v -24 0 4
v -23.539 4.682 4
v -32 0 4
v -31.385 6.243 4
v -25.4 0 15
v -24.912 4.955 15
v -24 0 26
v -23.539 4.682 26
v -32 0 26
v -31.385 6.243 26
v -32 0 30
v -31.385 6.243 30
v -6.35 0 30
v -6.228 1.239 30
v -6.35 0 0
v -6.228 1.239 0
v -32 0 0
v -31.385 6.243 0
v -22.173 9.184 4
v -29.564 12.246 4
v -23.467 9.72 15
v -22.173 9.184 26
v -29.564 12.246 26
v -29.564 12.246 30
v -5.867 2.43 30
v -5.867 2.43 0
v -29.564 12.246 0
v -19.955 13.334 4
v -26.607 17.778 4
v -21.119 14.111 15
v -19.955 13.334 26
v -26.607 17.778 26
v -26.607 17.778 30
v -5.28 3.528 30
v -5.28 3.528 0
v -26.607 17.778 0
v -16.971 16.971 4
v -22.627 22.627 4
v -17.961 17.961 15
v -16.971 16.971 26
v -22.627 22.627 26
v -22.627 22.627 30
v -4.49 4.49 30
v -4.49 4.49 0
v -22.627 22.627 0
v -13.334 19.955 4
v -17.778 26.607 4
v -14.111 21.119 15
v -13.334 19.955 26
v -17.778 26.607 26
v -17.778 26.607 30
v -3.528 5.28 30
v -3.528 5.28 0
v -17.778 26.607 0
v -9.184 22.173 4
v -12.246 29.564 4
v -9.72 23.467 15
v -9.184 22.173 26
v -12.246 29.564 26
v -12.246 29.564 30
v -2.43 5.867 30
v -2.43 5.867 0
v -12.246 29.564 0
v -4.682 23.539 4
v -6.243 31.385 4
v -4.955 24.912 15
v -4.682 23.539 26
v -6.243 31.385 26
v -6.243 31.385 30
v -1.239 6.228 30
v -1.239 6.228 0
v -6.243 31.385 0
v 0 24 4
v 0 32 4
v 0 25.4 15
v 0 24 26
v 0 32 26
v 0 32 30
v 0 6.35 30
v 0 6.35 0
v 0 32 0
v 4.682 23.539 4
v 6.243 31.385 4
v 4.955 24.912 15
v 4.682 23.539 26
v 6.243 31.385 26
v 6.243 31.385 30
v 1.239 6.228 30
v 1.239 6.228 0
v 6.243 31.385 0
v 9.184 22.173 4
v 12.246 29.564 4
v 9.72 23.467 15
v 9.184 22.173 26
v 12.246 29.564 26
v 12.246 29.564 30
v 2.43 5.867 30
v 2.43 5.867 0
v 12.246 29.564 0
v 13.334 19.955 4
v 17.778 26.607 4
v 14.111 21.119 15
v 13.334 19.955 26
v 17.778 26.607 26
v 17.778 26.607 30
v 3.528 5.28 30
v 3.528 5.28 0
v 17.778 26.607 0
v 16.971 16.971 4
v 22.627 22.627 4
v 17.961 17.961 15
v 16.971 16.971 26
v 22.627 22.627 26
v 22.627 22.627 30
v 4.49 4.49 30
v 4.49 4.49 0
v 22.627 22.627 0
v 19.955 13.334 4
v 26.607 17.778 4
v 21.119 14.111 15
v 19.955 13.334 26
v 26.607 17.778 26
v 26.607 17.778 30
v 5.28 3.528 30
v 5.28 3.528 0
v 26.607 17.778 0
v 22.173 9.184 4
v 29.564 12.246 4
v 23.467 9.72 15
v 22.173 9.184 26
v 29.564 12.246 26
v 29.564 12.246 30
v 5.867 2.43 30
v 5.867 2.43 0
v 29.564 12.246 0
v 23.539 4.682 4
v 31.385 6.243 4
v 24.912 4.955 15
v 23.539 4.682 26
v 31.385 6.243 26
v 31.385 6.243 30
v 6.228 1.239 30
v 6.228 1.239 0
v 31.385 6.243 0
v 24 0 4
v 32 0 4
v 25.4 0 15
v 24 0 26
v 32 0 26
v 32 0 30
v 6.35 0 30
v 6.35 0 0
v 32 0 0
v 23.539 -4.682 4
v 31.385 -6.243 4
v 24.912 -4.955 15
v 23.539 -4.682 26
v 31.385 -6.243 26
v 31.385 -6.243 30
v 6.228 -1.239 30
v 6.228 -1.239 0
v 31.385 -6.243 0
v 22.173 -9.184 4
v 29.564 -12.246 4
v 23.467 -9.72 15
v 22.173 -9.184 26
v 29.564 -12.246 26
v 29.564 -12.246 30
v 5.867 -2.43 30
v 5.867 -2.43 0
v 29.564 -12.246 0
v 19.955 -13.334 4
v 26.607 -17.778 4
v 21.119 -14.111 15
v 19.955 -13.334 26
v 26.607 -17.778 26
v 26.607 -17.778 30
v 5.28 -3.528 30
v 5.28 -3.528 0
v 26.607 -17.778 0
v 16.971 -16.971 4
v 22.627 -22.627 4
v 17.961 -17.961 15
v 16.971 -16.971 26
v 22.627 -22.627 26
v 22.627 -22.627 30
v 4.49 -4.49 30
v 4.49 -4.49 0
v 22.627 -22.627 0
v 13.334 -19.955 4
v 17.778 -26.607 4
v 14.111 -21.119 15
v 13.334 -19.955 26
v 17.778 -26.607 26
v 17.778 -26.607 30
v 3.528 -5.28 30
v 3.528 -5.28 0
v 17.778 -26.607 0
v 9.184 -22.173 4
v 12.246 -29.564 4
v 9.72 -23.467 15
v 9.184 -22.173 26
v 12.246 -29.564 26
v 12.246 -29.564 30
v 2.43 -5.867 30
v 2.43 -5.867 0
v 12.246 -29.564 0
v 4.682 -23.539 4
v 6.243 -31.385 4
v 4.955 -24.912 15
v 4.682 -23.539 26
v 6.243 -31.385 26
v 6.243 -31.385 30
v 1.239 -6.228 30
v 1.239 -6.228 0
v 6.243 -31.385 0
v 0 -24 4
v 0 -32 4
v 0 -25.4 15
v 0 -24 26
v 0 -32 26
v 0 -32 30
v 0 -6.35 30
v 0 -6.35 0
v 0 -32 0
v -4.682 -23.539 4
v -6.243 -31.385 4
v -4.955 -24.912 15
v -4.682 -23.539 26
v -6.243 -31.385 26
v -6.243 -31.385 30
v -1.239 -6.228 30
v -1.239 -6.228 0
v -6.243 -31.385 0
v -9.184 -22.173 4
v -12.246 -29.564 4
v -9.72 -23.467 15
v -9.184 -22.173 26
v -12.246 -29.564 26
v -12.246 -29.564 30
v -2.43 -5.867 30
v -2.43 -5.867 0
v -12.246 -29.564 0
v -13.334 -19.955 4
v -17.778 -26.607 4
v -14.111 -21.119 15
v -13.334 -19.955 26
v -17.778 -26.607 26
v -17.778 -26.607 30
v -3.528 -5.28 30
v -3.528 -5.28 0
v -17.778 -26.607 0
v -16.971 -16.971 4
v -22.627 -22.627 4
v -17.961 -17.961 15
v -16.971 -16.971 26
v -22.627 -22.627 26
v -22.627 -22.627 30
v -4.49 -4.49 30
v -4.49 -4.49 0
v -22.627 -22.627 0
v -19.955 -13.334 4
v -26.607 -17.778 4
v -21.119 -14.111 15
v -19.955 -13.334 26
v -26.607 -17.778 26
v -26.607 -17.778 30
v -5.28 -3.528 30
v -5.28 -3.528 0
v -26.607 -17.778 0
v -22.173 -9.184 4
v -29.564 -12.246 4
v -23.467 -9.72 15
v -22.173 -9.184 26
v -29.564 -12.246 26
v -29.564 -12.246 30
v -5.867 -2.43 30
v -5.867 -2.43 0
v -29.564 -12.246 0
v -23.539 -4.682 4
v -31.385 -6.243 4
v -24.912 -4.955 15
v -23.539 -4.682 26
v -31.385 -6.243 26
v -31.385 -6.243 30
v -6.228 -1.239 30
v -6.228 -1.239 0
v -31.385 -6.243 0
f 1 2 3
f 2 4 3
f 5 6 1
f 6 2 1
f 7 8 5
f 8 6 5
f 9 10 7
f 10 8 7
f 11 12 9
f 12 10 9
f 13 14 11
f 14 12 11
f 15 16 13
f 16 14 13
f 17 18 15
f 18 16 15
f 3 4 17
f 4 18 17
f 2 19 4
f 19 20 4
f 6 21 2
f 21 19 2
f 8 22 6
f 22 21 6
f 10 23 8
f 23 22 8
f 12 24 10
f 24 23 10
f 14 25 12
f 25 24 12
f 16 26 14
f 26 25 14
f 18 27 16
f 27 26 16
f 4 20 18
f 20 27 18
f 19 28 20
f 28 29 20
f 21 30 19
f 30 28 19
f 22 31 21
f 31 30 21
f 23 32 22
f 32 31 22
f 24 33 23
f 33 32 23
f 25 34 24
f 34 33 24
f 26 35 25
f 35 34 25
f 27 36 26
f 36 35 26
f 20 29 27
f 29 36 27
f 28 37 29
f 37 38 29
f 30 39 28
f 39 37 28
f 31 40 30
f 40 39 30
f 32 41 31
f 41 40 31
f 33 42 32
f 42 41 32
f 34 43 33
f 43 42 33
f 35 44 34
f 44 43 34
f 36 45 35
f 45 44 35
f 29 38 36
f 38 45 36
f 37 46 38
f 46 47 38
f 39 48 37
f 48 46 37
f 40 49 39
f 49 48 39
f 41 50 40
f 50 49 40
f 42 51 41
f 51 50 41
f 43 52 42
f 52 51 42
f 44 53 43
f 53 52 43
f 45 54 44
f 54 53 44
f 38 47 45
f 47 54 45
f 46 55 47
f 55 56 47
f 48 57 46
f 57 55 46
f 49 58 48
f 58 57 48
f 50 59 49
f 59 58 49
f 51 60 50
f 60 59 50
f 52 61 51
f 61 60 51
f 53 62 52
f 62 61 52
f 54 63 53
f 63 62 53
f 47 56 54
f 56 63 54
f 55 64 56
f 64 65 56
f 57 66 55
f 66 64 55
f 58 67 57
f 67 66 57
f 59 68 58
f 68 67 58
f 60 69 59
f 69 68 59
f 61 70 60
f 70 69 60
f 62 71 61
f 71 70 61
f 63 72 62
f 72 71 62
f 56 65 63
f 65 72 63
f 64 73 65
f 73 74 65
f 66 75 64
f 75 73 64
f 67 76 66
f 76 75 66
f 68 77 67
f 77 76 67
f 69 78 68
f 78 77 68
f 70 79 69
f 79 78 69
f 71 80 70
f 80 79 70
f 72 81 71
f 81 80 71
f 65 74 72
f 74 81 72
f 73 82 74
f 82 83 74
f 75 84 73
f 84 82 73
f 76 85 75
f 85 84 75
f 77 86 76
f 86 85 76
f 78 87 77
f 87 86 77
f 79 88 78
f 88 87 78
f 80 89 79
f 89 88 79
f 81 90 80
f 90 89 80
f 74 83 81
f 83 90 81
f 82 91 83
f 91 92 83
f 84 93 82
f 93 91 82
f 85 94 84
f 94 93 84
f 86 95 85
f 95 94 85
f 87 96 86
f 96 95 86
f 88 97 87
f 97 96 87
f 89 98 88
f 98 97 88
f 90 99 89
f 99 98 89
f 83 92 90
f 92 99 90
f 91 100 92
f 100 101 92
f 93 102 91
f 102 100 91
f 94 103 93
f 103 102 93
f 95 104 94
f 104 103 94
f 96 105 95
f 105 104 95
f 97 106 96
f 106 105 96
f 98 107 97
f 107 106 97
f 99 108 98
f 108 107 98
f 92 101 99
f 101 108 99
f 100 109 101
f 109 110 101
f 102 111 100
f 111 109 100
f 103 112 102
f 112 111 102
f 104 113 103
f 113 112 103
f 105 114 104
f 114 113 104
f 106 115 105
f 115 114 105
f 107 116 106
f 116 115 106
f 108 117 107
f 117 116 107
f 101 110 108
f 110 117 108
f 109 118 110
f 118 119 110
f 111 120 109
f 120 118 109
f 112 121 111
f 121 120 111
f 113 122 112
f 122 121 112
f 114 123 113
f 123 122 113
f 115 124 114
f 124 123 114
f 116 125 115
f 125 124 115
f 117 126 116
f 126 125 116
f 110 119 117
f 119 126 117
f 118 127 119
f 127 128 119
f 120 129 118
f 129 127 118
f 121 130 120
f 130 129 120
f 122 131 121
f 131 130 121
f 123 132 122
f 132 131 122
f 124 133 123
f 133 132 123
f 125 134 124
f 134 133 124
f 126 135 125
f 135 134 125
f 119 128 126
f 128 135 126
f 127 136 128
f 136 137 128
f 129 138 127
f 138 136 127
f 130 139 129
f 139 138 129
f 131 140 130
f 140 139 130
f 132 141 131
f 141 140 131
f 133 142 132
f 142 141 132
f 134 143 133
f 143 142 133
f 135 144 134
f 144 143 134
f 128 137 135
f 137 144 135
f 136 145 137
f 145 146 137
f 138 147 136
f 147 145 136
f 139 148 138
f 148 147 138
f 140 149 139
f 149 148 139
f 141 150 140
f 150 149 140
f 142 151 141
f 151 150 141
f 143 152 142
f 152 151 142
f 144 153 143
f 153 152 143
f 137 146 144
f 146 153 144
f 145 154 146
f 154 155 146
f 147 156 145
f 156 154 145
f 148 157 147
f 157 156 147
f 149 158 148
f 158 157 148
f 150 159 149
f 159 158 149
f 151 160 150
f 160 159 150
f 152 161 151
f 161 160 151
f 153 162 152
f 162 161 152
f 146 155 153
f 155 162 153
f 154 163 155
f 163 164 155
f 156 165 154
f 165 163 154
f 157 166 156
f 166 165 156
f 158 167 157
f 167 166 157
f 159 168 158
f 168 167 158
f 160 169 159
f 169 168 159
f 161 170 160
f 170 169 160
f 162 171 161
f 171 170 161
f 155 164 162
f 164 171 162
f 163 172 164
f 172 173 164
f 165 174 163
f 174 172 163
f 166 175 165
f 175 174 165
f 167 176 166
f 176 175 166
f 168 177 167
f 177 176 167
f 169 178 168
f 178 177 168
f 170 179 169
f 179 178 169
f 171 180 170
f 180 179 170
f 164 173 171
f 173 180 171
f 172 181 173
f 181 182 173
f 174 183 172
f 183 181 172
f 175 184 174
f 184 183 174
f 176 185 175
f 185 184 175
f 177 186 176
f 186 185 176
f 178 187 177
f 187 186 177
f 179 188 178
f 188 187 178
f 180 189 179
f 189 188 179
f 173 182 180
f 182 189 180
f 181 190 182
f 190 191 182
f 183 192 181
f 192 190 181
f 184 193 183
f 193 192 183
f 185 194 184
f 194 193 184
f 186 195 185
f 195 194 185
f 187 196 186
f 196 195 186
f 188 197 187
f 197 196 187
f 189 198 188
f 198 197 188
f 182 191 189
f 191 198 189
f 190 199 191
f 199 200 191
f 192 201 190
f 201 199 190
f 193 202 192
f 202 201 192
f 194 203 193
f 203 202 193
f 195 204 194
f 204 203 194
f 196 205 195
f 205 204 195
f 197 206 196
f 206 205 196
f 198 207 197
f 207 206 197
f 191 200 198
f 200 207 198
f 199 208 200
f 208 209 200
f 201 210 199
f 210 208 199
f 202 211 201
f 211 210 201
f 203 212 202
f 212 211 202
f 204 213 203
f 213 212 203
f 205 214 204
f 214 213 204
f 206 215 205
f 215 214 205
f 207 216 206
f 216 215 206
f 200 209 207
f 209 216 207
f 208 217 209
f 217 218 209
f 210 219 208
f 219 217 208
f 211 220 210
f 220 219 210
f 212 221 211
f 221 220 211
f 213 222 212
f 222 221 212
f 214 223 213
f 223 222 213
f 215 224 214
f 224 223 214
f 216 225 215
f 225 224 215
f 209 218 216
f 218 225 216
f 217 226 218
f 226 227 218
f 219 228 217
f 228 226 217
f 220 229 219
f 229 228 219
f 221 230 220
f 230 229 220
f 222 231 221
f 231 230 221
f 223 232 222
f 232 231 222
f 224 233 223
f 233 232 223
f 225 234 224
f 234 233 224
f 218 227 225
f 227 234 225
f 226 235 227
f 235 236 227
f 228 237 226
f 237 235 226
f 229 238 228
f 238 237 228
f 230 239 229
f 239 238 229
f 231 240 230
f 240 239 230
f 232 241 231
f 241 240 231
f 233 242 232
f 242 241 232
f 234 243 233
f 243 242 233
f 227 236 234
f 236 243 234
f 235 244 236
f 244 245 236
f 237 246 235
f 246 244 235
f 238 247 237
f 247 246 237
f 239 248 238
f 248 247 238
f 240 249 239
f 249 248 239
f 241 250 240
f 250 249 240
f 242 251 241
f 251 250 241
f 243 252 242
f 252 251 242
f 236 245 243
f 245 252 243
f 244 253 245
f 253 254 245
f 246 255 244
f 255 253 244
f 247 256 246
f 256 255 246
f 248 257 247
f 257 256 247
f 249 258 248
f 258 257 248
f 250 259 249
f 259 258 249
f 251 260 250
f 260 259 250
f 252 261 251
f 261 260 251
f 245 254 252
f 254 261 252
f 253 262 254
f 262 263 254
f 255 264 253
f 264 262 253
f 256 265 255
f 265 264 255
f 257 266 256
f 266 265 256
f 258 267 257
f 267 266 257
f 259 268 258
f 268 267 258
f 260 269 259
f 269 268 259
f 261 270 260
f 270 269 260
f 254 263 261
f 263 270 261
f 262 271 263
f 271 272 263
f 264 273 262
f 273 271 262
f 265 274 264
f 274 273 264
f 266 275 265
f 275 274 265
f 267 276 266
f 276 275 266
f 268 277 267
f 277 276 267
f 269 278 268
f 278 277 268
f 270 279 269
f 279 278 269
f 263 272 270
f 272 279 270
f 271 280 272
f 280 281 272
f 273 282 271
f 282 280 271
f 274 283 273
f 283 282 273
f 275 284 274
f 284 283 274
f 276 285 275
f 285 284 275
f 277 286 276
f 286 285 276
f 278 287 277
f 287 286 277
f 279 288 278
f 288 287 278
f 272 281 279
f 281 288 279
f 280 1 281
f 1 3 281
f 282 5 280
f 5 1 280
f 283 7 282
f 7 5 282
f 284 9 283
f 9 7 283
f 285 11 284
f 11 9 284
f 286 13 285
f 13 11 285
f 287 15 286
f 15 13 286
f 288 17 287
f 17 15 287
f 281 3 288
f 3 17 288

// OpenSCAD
$fn = 32;

// ----------------------------------------------------------------------
// Belt roller: 48 mm barrel, 30 mm wide, bore 12.7 mm
// ----------------------------------------------------------------------

// --- parameters (mm) ---
bore_d = 12.7;            // bore
barrel_d = 48;            // barrel diameter
roller_w = 30;            // roller width
flange_d = 64;            // flange diameter
flange_t = 4;             // flange thickness
hub_d = 36.7;             // hub diameter

roller_profile = [[6.35, 0], [32, 0], [32, 4], [24, 4], [25.4, 15], [24, 26], [32, 26], [32, 30], [6.35, 30]];

/* the profile stays clear of the axis, so the bore comes out of the revolve */
rotate_extrude() polygon(roller_profile);
